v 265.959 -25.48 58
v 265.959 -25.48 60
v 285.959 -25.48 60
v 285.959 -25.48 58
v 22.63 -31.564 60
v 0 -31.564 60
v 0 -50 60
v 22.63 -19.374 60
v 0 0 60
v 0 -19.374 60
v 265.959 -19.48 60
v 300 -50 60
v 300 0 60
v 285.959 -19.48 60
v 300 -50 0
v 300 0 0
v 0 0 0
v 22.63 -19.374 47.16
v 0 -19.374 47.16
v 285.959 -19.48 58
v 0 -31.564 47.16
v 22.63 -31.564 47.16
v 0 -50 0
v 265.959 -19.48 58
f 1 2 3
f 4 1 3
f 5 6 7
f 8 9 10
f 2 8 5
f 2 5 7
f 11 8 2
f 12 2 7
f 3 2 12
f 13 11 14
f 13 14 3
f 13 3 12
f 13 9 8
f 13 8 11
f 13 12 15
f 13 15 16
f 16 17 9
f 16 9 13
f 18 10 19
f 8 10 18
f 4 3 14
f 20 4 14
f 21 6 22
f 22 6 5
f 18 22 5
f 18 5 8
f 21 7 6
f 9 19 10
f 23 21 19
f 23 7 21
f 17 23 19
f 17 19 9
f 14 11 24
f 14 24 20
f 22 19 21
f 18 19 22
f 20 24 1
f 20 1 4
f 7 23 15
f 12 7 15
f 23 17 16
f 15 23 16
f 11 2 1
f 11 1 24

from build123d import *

# Parameters (mm, degrees)
SKETCH1_W           = 300
SKETCH1_H           = 50
BOSS_EXTRUDE1_DEPTH = 60
SKETCH5_W           = 22.63
SKETCH5_H           = 12.19
CUT_EXTRUDE2_DEPTH  = 12.84
SKETCH4_W           = 20
SKETCH4_H           = 6
CUT_EXTRUDE3_DEPTH  = 2


with BuildPart() as part:
    # Sketch1 → Boss-Extrude1 (new body)
    with BuildSketch(Plane.XY):
        with Locations((150, -25)):
            Rectangle(SKETCH1_W, SKETCH1_H)
    extrude(amount=BOSS_EXTRUDE1_DEPTH)

    # Sketch5 → Cut-Extrude2 (cut)
    with BuildSketch(Plane.XY.offset(60)):
        with Locations((11.315, -25.468667548)):
            Rectangle(SKETCH5_W, SKETCH5_H)
    extrude(amount=-CUT_EXTRUDE2_DEPTH, mode=Mode.SUBTRACT)

    # Sketch4 → Cut-Extrude3 (cut)
    with BuildSketch(Plane.XY.offset(60)):
        with Locations((275.959149907, -22.479653517)):
            Rectangle(SKETCH4_W, SKETCH4_H)
    extrude(amount=-CUT_EXTRUDE3_DEPTH, mode=Mode.SUBTRACT)


solid = part.part
